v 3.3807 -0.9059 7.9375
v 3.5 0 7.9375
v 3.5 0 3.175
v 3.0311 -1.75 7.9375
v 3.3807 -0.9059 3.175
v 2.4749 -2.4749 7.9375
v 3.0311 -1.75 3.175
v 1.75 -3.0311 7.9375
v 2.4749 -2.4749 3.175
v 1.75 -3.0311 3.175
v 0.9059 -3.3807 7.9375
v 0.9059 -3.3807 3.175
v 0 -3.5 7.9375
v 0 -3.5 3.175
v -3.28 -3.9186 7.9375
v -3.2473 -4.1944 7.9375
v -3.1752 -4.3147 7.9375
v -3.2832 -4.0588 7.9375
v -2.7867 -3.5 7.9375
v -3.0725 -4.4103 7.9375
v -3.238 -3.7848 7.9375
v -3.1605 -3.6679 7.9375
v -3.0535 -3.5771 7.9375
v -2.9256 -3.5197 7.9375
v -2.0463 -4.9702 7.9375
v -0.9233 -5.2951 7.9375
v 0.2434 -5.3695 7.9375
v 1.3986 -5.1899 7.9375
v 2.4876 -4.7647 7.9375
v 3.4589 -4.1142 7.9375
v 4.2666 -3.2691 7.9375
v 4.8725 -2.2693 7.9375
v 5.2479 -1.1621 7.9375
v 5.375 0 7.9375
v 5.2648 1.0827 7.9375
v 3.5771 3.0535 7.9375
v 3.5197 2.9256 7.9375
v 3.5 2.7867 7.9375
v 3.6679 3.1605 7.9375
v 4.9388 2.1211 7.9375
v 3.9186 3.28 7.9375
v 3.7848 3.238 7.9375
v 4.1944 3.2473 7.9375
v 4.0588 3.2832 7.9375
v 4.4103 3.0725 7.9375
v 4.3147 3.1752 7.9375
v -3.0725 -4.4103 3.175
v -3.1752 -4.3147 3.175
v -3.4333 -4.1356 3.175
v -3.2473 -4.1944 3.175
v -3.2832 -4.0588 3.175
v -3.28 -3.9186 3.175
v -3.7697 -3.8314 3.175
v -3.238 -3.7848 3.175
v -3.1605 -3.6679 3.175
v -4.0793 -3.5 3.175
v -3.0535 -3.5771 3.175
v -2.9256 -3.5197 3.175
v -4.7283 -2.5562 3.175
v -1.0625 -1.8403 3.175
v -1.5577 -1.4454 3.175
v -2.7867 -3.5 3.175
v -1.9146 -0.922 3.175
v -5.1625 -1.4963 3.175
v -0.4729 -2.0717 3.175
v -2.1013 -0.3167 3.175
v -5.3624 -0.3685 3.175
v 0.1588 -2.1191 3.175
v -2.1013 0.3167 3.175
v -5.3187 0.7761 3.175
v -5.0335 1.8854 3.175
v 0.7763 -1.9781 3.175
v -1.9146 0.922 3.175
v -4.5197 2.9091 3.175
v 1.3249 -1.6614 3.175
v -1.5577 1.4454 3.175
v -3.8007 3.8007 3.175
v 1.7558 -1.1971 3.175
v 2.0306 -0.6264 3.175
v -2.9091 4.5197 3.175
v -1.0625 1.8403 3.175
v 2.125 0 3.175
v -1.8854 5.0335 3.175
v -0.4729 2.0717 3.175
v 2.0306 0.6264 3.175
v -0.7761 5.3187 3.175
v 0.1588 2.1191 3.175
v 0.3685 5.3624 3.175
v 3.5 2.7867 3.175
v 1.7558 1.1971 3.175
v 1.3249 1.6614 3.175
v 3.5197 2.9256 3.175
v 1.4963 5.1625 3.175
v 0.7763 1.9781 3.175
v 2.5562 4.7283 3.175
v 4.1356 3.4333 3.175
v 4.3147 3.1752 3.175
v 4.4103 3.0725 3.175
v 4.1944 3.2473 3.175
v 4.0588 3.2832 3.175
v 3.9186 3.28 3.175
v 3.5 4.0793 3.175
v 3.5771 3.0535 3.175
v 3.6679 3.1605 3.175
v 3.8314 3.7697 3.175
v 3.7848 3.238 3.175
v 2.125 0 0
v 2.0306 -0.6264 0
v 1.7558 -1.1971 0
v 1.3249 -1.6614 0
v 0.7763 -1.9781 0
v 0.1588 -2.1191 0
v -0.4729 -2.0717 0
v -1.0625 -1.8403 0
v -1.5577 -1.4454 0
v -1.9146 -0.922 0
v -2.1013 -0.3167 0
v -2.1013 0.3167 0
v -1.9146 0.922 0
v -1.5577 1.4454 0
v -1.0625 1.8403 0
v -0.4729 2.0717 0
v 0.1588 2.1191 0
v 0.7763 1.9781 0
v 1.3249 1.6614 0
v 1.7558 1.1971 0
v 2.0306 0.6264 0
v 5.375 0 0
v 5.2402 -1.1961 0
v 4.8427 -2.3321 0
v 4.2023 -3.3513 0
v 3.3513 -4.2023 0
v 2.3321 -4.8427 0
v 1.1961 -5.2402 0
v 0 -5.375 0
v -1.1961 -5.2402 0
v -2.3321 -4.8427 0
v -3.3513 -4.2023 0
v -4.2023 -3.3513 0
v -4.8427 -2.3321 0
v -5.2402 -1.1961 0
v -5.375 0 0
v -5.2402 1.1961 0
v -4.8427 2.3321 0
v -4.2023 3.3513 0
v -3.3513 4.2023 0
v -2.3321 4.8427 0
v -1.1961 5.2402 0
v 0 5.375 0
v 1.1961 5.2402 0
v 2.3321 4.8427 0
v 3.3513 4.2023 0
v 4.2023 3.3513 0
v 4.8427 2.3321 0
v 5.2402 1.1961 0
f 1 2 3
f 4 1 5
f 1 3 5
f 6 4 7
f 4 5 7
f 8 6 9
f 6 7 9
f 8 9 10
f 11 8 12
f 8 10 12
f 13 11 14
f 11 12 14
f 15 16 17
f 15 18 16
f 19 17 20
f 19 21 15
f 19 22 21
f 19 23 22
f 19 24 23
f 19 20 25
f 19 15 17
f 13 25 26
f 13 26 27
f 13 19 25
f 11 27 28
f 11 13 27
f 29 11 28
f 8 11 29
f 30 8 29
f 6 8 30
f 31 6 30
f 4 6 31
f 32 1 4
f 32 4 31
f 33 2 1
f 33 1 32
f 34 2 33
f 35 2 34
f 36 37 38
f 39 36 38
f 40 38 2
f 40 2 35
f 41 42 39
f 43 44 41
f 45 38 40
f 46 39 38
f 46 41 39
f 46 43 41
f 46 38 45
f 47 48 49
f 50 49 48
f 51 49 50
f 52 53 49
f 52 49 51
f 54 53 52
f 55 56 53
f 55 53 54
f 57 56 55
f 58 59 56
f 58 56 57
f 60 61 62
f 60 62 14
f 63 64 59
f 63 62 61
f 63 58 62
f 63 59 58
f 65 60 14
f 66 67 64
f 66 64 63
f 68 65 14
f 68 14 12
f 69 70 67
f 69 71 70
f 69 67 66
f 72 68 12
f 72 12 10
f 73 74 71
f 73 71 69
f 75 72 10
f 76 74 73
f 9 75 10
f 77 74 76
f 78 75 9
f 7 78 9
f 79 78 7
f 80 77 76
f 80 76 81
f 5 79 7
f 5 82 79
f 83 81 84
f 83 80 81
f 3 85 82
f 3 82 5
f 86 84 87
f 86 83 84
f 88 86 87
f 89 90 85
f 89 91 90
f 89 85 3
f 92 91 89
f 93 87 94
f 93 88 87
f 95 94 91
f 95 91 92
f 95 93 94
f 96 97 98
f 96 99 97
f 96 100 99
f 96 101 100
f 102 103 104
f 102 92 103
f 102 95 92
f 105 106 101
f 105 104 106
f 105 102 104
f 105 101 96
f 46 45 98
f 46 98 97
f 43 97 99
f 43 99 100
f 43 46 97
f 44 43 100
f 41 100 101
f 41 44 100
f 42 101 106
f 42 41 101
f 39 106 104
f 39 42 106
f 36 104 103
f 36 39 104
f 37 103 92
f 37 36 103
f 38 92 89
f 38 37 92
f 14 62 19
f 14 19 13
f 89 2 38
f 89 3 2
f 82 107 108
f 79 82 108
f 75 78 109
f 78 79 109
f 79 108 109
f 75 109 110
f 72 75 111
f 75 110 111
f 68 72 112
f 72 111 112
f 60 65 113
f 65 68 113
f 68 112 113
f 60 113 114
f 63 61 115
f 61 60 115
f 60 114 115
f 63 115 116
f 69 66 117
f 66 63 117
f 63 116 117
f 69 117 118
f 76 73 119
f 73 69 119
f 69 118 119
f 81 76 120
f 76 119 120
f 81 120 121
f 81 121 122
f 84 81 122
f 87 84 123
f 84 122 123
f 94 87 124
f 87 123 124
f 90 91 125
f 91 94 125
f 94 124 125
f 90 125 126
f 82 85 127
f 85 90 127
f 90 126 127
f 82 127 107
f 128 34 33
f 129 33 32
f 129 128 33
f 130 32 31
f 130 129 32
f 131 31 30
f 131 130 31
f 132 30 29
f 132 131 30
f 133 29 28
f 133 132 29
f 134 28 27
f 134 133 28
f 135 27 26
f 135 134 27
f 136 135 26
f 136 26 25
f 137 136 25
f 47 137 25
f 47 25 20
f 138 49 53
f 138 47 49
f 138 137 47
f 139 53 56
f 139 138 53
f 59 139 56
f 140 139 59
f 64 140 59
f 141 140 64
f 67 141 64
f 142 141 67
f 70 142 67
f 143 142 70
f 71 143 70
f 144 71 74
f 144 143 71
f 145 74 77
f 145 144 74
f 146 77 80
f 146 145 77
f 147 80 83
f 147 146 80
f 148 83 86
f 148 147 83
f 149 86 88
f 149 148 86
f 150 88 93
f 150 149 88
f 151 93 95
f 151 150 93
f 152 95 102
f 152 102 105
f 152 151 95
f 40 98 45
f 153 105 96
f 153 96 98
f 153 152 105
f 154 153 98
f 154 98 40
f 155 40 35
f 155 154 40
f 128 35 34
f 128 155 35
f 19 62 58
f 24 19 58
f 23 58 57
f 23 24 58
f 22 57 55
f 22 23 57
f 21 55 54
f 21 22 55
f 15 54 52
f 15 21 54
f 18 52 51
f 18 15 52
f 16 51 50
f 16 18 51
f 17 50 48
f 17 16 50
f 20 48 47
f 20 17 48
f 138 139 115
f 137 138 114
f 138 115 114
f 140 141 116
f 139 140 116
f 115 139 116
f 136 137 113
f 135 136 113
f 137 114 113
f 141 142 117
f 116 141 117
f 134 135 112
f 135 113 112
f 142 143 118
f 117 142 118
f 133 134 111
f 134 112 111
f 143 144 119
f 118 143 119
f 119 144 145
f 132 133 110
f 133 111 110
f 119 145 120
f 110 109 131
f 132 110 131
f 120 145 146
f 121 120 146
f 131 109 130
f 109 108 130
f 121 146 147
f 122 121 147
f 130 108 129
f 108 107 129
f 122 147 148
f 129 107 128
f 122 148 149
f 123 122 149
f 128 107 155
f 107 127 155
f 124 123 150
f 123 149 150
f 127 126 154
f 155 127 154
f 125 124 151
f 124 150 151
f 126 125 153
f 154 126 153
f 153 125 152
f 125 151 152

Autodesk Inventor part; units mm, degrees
ref_plane "YZ Plane" through (0, 0, 0) normal (1, 0, 0) x (0, 1, 0)
ref_plane "XZ Plane" through (0, 0, 0) normal (0, 1, 0) x (-1, 0, 0)
ref_plane "XY Plane" through (0, 0, 0) normal (0, 0, 1) x (1, 0, 0)
sketch "Sketch1" plane through (0, 0, 0) normal (0, 0, 1) x (1, 0, 0)
  circle A0 centre (0, 0) radius 2.125
  circle A1 centre (0, 0) radius 5.375
  line L0 (0, 0) -> (0, 5.375) construction
  line L1 (3.5, 0) -> (3.5, 5.375)
  line L2 (-3.5, 5.375) -> (-3.5, 0)
  arc A2 (-3.5, 0) -> (3.5, 0) centre (0, 0) ccw
  arc A3 (3.5, 5.375) -> (-3.5, 5.375) centre (0, 5.375) ccw construction
  line L3 (0, 0) -> (-5.375, 0) construction
  line L4 (0, 3.5) -> (-5.375, 3.5)
  line L5 (-5.375, -3.5) -> (0, -3.5)
  arc A4 (0, -3.5) -> (0, 3.5) centre (0, 0) ccw
  arc A5 (-5.375, 3.5) -> (-5.375, -3.5) centre (-5.375, 0) ccw construction
  circle A6 centre (0, 11.725) radius 6.35 construction
  circle A7 centre (0, 9.85) radius 6.35 construction
  arc A8 (3.5, 4.0793) -> (-4.0793, -3.5) centre (1.9038, -1.9038) ccw
  point P0 (0, 2.6875)
  point P1 (-2.6875, 0)
  point P2 (0, -3.5)
  point P3 (-4.6837, -3.75)
  point P4 (3.75, 4.6837)
  point P5 (-3.5, 4.0793)
  point P6 (-3.5, 3.5)
  point P7 (-4.0793, 3.5)
  dimension "d0" = 4.25
  dimension "d3" = 10.75
  dimension "d4" = 7
  dimension "d5" = 7
  dimension "d6" = 90
  dimension "d7" = 12.7
  dimension "d8" = 12.7
extrude "Extrusion1" add sketch "Sketch1" along normal blind 3.175
extrude "Extrusion2" add sketch "Sketch1" along normal blind 7.9375 contours A1 L5 A2 L1
fillet "Fillet1" radius 0.5 2 edges at (3.5, 4.0793, 5.5563) (-4.0793, -3.5, 5.5563)
equation "\"d4\" = d5"
properties part number "Cam - Shell" material "Nylon 6/6"
